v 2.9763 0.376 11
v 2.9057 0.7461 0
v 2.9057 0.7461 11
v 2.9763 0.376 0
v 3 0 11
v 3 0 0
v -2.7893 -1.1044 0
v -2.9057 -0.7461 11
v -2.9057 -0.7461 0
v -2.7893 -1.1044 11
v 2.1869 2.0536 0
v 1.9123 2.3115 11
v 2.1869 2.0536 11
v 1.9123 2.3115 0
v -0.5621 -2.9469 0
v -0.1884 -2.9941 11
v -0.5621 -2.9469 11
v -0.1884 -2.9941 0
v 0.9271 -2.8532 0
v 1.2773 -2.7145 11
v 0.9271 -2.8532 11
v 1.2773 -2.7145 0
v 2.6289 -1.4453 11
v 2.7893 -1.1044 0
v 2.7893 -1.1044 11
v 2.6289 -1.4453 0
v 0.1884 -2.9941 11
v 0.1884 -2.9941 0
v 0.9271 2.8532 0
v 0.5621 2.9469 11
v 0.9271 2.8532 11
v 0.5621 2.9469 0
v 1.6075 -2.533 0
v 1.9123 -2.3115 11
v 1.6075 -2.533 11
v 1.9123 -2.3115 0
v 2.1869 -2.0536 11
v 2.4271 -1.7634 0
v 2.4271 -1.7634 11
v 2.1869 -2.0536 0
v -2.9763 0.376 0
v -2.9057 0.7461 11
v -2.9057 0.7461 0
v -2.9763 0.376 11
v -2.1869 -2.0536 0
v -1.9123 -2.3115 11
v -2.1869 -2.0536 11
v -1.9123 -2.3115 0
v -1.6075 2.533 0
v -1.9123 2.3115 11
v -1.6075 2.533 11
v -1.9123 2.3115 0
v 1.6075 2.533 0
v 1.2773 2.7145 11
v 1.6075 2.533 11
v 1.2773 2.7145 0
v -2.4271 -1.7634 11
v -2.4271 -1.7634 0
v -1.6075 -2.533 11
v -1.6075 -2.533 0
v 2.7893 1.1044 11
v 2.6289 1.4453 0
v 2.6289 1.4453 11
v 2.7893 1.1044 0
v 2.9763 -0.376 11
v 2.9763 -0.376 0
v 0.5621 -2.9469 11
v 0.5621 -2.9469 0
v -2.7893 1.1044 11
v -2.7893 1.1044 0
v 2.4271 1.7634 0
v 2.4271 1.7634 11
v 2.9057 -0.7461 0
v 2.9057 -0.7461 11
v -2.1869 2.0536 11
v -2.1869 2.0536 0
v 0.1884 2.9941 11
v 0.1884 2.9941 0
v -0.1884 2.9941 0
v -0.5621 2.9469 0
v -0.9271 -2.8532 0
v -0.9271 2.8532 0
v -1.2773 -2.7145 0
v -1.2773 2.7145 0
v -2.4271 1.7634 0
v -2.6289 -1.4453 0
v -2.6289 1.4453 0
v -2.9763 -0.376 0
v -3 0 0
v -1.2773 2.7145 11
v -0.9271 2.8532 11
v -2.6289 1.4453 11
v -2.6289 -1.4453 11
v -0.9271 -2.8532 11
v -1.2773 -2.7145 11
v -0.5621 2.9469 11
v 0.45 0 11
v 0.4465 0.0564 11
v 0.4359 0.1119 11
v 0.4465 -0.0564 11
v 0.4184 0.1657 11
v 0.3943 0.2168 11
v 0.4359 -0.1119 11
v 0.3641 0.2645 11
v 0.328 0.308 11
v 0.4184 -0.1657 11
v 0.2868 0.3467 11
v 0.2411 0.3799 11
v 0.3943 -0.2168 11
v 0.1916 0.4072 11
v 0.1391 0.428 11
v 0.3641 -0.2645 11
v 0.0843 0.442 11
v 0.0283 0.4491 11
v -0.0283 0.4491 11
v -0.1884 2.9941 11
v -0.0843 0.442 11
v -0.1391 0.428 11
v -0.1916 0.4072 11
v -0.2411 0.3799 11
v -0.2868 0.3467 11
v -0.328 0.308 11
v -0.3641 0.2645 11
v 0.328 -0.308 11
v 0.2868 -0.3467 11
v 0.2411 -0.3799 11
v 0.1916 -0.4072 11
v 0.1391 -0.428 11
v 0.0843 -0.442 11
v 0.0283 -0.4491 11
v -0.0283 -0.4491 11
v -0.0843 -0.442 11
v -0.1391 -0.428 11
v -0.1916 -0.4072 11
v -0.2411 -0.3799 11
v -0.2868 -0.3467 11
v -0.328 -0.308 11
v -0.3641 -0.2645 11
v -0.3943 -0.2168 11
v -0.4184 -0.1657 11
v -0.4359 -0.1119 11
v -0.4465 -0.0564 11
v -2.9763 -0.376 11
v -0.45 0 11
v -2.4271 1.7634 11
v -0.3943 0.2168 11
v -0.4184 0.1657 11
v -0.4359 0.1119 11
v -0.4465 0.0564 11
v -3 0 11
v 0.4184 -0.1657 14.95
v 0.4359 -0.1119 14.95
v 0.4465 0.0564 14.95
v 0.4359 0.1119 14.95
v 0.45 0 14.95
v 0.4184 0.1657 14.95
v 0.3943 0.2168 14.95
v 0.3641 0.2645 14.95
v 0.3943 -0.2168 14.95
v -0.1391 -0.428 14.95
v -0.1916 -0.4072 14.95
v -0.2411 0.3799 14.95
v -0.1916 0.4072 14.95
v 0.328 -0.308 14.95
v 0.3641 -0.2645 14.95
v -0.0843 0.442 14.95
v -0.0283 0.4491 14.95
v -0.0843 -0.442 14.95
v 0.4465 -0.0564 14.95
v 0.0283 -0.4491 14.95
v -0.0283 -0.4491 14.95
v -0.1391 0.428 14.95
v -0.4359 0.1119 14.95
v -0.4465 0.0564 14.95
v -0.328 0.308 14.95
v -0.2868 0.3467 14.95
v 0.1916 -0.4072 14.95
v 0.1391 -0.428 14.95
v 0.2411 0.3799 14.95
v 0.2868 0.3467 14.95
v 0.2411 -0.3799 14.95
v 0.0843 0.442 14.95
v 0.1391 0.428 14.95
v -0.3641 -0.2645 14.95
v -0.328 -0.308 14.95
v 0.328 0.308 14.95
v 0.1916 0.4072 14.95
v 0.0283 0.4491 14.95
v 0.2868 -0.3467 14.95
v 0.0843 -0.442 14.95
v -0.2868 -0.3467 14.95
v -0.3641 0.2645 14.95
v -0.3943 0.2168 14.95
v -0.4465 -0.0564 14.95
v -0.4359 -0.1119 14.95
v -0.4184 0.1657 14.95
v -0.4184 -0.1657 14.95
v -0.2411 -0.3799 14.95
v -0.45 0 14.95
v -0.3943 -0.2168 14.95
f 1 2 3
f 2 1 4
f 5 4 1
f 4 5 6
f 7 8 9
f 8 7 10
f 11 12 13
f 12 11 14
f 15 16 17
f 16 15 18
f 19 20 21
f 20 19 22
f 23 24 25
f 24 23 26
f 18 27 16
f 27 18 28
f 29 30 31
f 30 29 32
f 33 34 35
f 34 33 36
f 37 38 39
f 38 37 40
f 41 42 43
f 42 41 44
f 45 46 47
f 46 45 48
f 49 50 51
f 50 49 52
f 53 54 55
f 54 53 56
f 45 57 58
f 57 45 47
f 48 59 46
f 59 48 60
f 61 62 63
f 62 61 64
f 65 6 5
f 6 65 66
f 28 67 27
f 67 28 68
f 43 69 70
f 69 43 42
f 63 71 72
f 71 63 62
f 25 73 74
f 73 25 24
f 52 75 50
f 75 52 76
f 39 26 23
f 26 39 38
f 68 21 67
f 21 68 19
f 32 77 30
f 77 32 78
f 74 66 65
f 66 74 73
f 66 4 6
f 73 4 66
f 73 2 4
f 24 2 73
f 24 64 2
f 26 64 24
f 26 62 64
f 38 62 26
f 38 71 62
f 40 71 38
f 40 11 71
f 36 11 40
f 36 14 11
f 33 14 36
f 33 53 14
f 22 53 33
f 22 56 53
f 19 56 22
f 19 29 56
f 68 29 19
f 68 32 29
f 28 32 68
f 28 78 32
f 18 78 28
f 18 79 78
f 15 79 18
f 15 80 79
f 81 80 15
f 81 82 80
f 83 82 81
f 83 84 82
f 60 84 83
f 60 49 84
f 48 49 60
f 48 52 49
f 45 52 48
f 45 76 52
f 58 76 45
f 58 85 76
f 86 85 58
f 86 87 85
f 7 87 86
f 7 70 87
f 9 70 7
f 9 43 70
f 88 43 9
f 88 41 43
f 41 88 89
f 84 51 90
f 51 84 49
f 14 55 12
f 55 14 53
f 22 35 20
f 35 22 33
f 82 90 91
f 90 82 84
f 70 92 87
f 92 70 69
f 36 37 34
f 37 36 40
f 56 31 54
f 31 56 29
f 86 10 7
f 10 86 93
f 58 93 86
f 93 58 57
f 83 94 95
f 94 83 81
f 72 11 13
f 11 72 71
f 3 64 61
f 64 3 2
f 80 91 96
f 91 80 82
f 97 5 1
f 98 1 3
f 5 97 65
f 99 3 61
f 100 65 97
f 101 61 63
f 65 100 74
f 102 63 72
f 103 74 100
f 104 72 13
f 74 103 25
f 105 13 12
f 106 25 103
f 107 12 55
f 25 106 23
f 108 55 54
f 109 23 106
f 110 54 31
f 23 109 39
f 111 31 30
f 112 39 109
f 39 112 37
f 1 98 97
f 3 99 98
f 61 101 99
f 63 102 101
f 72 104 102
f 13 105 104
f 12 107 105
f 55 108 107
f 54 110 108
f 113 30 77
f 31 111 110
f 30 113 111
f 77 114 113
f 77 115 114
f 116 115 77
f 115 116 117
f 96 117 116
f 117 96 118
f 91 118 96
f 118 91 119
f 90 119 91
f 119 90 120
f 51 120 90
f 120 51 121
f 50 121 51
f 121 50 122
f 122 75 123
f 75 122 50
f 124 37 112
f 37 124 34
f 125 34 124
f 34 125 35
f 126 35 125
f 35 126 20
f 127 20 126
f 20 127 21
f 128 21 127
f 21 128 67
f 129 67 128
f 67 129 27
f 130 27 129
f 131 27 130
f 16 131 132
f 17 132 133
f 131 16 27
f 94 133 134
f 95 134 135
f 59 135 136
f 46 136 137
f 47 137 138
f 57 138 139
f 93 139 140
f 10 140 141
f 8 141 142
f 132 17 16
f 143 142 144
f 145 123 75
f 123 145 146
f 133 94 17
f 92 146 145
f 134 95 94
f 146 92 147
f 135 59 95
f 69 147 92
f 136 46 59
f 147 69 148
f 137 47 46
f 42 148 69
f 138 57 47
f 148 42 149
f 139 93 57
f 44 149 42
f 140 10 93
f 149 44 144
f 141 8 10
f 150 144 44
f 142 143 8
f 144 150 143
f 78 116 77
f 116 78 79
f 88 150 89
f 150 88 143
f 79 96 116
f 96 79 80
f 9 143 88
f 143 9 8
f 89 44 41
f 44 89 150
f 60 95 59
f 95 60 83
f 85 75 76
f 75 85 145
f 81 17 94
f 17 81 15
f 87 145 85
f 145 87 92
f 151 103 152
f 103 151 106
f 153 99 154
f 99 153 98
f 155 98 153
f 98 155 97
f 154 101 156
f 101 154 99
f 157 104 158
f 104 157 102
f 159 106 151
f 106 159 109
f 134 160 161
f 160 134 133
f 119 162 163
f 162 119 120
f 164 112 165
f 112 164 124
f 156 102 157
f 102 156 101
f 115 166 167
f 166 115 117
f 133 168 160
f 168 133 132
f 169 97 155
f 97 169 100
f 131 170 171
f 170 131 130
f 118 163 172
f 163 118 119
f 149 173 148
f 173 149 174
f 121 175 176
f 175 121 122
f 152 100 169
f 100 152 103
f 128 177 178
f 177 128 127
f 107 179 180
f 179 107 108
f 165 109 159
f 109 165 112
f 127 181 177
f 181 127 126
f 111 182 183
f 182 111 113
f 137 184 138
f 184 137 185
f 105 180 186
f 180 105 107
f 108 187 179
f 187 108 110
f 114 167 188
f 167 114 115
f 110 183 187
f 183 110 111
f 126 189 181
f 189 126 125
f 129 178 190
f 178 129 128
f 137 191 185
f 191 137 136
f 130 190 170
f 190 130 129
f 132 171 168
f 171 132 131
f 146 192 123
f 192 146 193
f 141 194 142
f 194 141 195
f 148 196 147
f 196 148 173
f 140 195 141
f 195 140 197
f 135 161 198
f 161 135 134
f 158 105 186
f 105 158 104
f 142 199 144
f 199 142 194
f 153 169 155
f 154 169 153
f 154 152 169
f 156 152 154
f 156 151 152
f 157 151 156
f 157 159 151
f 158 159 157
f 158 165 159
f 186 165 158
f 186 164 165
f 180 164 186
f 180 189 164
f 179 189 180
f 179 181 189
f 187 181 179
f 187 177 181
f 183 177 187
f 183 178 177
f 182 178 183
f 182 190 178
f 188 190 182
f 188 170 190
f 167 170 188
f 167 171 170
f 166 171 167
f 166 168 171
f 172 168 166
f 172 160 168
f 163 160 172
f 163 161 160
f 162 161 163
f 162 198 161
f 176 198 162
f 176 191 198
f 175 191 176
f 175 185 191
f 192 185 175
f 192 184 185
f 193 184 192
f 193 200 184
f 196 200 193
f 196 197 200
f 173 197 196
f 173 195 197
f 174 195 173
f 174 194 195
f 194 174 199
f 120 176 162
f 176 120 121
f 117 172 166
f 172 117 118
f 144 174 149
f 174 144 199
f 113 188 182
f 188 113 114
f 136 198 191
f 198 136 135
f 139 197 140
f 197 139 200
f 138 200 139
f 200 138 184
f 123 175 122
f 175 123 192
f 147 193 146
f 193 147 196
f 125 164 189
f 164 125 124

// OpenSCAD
// Standoff Generator Module
//
// Author: Steven Nemetz
//
// Current version: https://github.com/snemetz/OpenSCAD-Modules/tree/master/standoffs
// Customizable: http://www.thingiverse.com/thing:1528494
/*
	REVISION HISTORY
	v0.2 Added Array-Same generation
	v0.1 Added hollow style
	Initial code refactored from :
		eriqjo's Standoff Customizer v1.0
			http://www.thingiverse.com/thing:351092
		and Kevin Osborn's Snap in PCB Standoff
*/
// TODO: Future Feature Ideas
//	flanges: top and/or bottom
//	flange styles:
//	bottom styles: support all top styles - rotate 180 and translate top
//	Look at adding features from http://www.thingiverse.com/thing:79944
//		or original http://www.thingiverse.com/thing:44894

//CUSTOMIZER VARIABLES

//Type of standoff(s) to generate
Generate = 1; // [1:Single, 2:Array-Same, 3:Array-Samples]
/* [Body] */
//Choose shape of the main body
Shape = 1; // [1:Round, 2:Square, 3:Hex]
//Select height of the main body,  mm
BaseHeight = 11; // [0:50]
//Select diameter of the main body, mm
BaseDia = 6; // [0:30]
/* [Top] */
//Choose style of the top section
Style = 1; // [1:Male, 2:Snap-In, 3:Flat, 4:Female, 5:Hollow]
//Select height of the top, mm
TopHeight = 4; // [2:20]
//Select diameter of the top, mm
TopDia = .9; // [1:25]
/* [Array Settings] */
//For array: Space between standoffs, X mm
X_Offset = 15; // [2:30]
//For array: Space between standoffs, Y mm
Y_Offset = 10; // [2:30]
//For Array-Same
Columns = 3;
//For Array-Same
Rows = 3;

//CUSTOMIZER VARIABLES END

/* [Hidden] */
// For sample array
Shapes = [1:3]; // All valid shapes
Styles = [1:5]; // All valid styles

RndFrags = 50; // number of facet fragments for round shapes
// Parameters: style, height, diameter, Thread_Height
module standoffTop(style, baseHeight, topHeight, diameter) {
	radius = diameter/2;
	if (style == 1) { //male
		translate([0,0, baseHeight + topHeight/2 - 0.1])
			cylinder(topHeight + 0.1, r = radius, $fn = RndFrags, center = true);
	} else if (style == 2) { // snapin
		// FIX: large top height - this is above base
		notchW = radius/1.5;//width of the flexy notch in terms of peg radius
		translate([0,0, baseHeight - 0.1]) // -2 needs to be a calc
			difference() {
				union() {
					// top standoff
					cylinder(r= radius,h = topHeight+1, $fn = RndFrags); //master peg
					// underside slant - relief for overhang
					translate([0,0,topHeight])
						cylinder(r1=radius,r2= radius+.5, h =1, $fn = RndFrags);
					// top slant - insertion cone
					translate([0,0,topHeight+1])
						cylinder(r1=radius+.5,r2= radius-.25, h =1, $fn = RndFrags);
					} //union
				// Internal cylinder cutout
				cylinder(r= radius-.5, h = topHeight+3, $fn = RndFrags);
				//notch for insertion flex
				translate([-(diameter+2)/2,-notchW/2,-0.1])
					cube([diameter+2,notchW,topHeight+2.2]);
			} //difference
	} else if (style == 3) { // flat - No top
	} else if (style == 4) { // female
		translate([0,0, baseHeight - topHeight/2 + 0.1])
			cylinder(topHeight + 0.1, r = radius, $fn = RndFrags, center = true);
	} else if (style == 5) { // hollow
		translate([0,0, baseHeight/2])
			cylinder(baseHeight + 0.1, r = radius, $fn = RndFrags, center = true);
	}
};
// Parameters: shape, height, diameter
module standoffBase(shape, height, diameter) {
	radius = diameter/2;
	if (shape == 1) { // round
		translate([0, 0, height/2])
			cylinder(height, r = radius, center = true, $fn = RndFrags);
	} else if (shape == 2) { // square
		translate([0,0, height/2])
			cube([diameter, diameter, height], center = true);
	} else if (shape == 3) { // hex
		cylinder(h = height, r = radius, center = false, $fn = 6);
	}
};
// Parameters: shape, style, Body_Diameter, Body_Height, Thread_Height, Thread_Dia
module standoff(shape, baseHeight, baseDiameter, style, topHeight, topDiameter) {
	if (style == 1 || style == 2) { // male or snap-in
		union() {
			standoffBase(shape, baseHeight, baseDiameter);
			standoffTop(style, baseHeight, topHeight, topDiameter);
		}
	} else if (style == 4 || style == 5) { // female or hollow
		difference() {
			standoffBase(shape, baseHeight, baseDiameter);
			standoffTop(style, baseHeight, topHeight, topDiameter);
		}
	} else if (style==3) { // flat - no top
		standoffBase(shape, baseHeight, baseDiameter);
	}
};

function range2vector(r) = [ for (i=r) i];

//
ShapesV = range2vector(Shapes);
StylesV = range2vector(Styles);
if (Generate == 1) { // single
	standoff(Shape,BaseHeight,BaseDia,Style,TopHeight,TopDia);
} else if (Generate == 2) { // array all same
	translate([-(X_Offset * (Rows+1))/2, -(Y_Offset * (Columns+1))/2, 0])
		union(){
			for (j = [1 : Rows]){
				translate([0,j * Y_Offset,0])
					for( i = [1 : Columns]){
						translate([i * X_Offset,0,0])
							standoff(Shape,BaseHeight,BaseDia,Style,TopHeight,TopDia);
					} // for
			} // for
		}; // union
} else if (Generate == 3) { // array Samples
	translate([-(X_Offset * (len(StylesV)+1))/2, -(Y_Offset * (len(ShapesV)+1))/2, 0])
		union(){
			for (shape = Shapes) {     // Rows of styles = row of a shape
				translate([0,shape * Y_Offset,0])
					for( style = Styles) {   // Columns of shapes = column of a style
						translate([style * X_Offset,0,0])
							standoff(shape, BaseHeight, BaseDia, style, TopHeight, TopDia);
					} // for
			} // for
		}; // union
};

// END
